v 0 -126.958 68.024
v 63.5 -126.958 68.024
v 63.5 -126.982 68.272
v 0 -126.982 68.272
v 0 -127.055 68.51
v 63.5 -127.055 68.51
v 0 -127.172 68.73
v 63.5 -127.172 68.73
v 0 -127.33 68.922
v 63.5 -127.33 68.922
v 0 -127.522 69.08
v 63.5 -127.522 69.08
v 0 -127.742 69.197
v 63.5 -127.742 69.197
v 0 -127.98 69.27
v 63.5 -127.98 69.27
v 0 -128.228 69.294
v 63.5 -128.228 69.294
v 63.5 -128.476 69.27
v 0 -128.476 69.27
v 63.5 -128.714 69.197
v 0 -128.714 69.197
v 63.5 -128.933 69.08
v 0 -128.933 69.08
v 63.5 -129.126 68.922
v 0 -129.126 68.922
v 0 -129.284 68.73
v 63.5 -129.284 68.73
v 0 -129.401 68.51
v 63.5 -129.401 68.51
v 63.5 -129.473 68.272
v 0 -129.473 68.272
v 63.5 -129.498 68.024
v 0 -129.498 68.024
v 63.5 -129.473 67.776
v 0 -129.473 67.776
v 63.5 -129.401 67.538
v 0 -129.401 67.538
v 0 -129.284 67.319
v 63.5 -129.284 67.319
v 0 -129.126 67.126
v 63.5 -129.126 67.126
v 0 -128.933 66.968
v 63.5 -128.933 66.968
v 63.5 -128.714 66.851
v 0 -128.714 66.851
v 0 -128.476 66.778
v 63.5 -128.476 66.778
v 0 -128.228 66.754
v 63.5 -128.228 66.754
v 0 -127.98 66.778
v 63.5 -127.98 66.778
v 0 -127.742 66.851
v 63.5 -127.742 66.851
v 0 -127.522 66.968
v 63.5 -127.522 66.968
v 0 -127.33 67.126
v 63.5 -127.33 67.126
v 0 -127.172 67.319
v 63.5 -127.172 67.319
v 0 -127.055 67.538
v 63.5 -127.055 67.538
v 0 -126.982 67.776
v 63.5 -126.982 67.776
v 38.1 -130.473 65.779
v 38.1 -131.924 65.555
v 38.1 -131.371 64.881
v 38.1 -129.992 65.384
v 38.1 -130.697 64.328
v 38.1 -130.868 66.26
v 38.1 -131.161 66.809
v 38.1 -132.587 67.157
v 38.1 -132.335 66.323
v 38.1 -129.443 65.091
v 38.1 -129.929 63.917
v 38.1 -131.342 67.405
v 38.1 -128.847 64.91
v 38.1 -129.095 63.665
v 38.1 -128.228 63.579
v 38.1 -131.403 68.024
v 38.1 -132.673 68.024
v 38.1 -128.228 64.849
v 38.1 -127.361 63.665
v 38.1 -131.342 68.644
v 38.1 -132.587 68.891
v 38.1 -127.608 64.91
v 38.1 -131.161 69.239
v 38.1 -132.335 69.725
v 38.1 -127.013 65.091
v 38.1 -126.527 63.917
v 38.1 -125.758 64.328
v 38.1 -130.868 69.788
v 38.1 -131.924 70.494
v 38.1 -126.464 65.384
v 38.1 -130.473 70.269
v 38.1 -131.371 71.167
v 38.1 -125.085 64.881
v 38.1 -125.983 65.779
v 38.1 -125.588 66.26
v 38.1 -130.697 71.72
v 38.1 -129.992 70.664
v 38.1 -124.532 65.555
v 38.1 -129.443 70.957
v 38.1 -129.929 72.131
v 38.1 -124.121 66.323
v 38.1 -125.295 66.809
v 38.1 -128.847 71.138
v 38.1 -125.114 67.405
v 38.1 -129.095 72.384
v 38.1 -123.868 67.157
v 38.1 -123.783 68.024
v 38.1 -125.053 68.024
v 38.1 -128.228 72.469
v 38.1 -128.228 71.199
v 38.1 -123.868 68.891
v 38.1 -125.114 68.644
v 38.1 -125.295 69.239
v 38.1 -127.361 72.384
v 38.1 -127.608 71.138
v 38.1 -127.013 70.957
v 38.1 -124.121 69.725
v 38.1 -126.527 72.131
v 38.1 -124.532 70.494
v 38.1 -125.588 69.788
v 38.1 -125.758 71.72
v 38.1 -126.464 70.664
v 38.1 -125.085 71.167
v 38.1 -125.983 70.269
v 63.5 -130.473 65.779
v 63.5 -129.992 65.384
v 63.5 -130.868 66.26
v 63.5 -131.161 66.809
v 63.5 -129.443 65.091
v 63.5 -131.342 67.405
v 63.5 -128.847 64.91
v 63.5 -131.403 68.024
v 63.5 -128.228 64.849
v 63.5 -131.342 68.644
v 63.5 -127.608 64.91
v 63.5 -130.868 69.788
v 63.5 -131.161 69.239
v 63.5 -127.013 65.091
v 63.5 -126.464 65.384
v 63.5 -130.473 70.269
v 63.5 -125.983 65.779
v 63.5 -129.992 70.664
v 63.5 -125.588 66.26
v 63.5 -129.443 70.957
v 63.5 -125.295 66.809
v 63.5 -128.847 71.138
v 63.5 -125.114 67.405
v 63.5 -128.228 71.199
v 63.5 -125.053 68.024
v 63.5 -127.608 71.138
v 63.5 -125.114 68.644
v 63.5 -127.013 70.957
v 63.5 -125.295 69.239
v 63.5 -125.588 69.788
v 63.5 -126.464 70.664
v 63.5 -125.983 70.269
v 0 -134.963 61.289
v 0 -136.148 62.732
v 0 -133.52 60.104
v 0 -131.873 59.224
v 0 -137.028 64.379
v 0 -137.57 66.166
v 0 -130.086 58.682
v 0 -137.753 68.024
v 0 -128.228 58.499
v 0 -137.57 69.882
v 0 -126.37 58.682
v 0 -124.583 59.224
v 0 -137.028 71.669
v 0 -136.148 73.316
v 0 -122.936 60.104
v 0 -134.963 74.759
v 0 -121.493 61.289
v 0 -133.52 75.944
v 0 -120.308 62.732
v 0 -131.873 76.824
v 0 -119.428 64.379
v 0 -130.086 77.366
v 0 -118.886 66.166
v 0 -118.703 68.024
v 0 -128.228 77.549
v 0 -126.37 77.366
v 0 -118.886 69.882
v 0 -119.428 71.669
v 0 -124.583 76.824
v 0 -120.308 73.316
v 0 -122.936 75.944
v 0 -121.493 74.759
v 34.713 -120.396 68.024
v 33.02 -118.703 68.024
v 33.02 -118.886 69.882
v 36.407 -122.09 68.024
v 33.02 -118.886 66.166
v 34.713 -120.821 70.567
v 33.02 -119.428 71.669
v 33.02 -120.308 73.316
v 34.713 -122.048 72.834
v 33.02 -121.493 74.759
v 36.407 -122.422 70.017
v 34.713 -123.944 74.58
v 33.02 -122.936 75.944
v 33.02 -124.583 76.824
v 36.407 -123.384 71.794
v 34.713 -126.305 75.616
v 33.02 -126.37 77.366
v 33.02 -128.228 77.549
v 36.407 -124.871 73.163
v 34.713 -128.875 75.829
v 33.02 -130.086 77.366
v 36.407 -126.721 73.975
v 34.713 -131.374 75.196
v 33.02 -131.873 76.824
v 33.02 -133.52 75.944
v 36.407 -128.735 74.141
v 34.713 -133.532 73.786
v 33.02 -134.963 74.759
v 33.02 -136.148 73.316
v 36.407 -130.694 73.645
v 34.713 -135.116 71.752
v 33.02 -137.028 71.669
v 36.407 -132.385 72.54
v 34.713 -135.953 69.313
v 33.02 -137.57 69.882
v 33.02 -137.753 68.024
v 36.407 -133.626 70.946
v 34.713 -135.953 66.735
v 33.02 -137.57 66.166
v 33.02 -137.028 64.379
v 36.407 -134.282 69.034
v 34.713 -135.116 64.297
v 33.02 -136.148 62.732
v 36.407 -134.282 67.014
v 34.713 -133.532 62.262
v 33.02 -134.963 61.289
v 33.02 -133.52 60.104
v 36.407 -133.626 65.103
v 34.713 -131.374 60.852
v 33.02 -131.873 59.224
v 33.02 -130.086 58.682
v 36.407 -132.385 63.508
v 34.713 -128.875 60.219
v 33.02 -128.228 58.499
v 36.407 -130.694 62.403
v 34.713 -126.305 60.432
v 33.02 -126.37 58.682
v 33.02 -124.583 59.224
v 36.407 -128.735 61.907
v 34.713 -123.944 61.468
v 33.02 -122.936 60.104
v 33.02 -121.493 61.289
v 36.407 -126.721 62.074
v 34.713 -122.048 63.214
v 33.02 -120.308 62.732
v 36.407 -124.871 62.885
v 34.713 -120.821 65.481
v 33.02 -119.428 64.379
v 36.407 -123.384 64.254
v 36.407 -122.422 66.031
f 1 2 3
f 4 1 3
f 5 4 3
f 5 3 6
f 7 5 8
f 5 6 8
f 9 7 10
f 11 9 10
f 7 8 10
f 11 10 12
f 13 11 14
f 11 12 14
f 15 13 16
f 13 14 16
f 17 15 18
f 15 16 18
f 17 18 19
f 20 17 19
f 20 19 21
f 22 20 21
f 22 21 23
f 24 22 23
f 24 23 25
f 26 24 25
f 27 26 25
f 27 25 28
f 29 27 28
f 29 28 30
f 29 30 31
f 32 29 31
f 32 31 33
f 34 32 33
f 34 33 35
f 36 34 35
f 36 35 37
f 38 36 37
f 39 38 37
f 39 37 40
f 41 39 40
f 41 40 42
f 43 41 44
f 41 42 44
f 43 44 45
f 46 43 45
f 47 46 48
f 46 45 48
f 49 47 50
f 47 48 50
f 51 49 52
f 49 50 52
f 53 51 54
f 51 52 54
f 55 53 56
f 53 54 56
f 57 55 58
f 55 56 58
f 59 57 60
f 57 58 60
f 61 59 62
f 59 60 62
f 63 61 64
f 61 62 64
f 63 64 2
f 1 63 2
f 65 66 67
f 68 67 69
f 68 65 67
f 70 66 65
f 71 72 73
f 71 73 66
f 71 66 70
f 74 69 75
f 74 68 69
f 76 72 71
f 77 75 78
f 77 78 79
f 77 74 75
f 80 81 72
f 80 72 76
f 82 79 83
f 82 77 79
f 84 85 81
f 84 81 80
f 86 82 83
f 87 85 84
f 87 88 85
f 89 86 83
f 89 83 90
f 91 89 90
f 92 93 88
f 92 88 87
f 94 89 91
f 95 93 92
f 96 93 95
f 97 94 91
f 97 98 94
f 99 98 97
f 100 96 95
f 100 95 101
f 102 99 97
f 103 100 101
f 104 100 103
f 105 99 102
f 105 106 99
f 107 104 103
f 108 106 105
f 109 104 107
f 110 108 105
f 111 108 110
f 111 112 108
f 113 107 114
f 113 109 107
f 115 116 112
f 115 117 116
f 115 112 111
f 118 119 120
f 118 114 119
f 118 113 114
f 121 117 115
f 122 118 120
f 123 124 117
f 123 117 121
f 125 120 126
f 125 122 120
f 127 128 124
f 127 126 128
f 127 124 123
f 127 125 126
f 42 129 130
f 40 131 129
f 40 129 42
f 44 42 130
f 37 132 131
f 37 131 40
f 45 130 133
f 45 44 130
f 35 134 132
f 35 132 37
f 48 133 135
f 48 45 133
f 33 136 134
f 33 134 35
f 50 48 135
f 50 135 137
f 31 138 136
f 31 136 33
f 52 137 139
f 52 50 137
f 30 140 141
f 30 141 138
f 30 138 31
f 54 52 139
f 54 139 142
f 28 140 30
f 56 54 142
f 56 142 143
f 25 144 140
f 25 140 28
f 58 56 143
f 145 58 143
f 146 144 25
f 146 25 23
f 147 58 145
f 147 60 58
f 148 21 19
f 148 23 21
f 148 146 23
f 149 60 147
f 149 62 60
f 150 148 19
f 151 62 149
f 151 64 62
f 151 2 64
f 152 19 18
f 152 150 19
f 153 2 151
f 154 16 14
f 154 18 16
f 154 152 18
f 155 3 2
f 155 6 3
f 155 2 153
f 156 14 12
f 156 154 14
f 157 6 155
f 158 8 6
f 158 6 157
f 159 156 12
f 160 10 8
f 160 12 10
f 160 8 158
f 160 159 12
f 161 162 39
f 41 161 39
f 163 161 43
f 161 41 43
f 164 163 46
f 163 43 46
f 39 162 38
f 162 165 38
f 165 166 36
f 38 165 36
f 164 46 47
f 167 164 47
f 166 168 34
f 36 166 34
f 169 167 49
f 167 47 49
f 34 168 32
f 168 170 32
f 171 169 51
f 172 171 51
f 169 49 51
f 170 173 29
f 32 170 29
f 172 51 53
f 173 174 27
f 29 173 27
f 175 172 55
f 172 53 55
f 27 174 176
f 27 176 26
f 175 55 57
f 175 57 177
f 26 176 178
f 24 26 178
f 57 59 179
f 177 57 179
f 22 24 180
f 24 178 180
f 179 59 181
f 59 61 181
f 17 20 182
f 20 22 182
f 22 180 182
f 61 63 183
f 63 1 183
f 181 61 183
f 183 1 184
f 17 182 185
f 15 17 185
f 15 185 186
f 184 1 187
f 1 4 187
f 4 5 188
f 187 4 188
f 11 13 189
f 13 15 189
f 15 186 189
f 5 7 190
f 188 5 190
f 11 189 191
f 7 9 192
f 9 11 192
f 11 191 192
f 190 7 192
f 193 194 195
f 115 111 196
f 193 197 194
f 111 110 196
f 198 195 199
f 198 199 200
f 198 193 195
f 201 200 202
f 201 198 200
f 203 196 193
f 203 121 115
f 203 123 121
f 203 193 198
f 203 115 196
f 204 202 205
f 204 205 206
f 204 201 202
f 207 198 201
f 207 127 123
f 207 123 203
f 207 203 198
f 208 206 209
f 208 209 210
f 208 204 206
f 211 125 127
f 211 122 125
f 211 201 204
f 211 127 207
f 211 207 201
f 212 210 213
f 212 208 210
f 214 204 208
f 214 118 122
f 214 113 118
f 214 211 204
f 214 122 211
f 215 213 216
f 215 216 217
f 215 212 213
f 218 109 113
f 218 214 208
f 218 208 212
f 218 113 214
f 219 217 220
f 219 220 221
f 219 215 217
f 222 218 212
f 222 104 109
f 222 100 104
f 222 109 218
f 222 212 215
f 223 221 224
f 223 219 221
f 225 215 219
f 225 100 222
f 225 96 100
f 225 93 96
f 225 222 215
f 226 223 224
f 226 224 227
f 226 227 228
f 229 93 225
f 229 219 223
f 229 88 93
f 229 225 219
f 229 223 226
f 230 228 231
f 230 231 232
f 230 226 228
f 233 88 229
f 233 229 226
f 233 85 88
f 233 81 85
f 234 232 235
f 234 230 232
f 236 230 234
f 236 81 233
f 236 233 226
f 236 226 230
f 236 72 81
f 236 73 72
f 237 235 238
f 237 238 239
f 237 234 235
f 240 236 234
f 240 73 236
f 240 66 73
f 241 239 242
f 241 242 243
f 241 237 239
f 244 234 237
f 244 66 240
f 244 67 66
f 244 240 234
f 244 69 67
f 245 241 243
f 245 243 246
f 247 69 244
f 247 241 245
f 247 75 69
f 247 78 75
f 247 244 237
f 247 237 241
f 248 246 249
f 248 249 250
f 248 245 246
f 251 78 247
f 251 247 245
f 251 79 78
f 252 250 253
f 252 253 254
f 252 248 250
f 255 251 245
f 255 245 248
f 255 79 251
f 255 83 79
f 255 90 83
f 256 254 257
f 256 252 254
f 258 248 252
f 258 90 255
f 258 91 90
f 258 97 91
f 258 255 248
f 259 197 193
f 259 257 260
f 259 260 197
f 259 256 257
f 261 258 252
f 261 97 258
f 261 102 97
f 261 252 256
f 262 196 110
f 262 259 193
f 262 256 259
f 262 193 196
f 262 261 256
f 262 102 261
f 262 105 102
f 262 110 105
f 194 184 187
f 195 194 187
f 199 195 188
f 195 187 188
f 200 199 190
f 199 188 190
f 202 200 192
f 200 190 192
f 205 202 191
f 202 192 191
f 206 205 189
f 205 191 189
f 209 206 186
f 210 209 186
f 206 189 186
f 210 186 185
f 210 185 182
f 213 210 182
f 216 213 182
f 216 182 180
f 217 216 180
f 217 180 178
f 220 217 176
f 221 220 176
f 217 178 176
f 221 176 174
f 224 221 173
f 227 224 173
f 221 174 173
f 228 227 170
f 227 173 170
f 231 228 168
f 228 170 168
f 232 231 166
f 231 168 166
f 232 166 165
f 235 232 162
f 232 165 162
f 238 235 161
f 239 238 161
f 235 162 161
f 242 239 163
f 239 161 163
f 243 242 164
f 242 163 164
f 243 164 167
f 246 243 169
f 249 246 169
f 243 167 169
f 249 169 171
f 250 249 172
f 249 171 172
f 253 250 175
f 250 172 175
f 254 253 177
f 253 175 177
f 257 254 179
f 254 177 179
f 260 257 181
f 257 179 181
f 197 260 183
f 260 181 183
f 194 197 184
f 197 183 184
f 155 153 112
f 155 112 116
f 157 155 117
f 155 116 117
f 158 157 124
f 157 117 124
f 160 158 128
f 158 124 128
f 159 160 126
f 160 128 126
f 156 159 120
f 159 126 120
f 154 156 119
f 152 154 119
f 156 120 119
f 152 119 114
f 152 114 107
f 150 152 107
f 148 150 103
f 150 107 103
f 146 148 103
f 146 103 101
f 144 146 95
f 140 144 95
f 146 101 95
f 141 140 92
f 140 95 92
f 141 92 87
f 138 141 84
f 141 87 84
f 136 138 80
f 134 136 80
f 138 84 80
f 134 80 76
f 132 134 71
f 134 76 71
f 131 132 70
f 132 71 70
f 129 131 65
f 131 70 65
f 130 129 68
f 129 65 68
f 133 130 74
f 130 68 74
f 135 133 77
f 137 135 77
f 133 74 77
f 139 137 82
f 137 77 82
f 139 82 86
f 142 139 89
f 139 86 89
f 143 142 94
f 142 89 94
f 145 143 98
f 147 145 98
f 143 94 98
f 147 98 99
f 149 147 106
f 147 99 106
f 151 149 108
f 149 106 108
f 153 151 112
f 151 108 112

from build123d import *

# Parameters (mm, degrees)
F0_R     = 9.525
F1_DEPTH = 38.1
F2_SIZE  = 5.08
F3_R     = 3.175
F4_DEPTH = 25.4
F5_R     = 1.27
F6_DEPTH = 189.484


with BuildPart() as f1:
    # F0 (on Right) → F1 (new body)
    with BuildSketch(Plane.YZ):
        with Locations((-128.22786, 68.024091)):
            Circle(F0_R)
    extrude(amount=F1_DEPTH)

    # F2
    f2_edges = [f1.edges().sort_by_distance(p)[0] for p in [
        (38.1, -137.75286, 68.024091),
    ]]
    chamfer(f2_edges, length=F2_SIZE)

    # F3 (on face) → F4 (join)
    with BuildSketch(Plane.YZ.offset(38.1)):
        with Locations((-128.22786, 68.024091)):
            Circle(F3_R)
    extrude(amount=F4_DEPTH)

    # F5 (on face) → F6 (cut)
    with BuildSketch(Plane.YZ.offset(63.5)):
        with Locations((-128.22786, 68.024091)):
            Circle(F5_R)
    extrude(amount=-F6_DEPTH, mode=Mode.SUBTRACT)


solid = f1.part
